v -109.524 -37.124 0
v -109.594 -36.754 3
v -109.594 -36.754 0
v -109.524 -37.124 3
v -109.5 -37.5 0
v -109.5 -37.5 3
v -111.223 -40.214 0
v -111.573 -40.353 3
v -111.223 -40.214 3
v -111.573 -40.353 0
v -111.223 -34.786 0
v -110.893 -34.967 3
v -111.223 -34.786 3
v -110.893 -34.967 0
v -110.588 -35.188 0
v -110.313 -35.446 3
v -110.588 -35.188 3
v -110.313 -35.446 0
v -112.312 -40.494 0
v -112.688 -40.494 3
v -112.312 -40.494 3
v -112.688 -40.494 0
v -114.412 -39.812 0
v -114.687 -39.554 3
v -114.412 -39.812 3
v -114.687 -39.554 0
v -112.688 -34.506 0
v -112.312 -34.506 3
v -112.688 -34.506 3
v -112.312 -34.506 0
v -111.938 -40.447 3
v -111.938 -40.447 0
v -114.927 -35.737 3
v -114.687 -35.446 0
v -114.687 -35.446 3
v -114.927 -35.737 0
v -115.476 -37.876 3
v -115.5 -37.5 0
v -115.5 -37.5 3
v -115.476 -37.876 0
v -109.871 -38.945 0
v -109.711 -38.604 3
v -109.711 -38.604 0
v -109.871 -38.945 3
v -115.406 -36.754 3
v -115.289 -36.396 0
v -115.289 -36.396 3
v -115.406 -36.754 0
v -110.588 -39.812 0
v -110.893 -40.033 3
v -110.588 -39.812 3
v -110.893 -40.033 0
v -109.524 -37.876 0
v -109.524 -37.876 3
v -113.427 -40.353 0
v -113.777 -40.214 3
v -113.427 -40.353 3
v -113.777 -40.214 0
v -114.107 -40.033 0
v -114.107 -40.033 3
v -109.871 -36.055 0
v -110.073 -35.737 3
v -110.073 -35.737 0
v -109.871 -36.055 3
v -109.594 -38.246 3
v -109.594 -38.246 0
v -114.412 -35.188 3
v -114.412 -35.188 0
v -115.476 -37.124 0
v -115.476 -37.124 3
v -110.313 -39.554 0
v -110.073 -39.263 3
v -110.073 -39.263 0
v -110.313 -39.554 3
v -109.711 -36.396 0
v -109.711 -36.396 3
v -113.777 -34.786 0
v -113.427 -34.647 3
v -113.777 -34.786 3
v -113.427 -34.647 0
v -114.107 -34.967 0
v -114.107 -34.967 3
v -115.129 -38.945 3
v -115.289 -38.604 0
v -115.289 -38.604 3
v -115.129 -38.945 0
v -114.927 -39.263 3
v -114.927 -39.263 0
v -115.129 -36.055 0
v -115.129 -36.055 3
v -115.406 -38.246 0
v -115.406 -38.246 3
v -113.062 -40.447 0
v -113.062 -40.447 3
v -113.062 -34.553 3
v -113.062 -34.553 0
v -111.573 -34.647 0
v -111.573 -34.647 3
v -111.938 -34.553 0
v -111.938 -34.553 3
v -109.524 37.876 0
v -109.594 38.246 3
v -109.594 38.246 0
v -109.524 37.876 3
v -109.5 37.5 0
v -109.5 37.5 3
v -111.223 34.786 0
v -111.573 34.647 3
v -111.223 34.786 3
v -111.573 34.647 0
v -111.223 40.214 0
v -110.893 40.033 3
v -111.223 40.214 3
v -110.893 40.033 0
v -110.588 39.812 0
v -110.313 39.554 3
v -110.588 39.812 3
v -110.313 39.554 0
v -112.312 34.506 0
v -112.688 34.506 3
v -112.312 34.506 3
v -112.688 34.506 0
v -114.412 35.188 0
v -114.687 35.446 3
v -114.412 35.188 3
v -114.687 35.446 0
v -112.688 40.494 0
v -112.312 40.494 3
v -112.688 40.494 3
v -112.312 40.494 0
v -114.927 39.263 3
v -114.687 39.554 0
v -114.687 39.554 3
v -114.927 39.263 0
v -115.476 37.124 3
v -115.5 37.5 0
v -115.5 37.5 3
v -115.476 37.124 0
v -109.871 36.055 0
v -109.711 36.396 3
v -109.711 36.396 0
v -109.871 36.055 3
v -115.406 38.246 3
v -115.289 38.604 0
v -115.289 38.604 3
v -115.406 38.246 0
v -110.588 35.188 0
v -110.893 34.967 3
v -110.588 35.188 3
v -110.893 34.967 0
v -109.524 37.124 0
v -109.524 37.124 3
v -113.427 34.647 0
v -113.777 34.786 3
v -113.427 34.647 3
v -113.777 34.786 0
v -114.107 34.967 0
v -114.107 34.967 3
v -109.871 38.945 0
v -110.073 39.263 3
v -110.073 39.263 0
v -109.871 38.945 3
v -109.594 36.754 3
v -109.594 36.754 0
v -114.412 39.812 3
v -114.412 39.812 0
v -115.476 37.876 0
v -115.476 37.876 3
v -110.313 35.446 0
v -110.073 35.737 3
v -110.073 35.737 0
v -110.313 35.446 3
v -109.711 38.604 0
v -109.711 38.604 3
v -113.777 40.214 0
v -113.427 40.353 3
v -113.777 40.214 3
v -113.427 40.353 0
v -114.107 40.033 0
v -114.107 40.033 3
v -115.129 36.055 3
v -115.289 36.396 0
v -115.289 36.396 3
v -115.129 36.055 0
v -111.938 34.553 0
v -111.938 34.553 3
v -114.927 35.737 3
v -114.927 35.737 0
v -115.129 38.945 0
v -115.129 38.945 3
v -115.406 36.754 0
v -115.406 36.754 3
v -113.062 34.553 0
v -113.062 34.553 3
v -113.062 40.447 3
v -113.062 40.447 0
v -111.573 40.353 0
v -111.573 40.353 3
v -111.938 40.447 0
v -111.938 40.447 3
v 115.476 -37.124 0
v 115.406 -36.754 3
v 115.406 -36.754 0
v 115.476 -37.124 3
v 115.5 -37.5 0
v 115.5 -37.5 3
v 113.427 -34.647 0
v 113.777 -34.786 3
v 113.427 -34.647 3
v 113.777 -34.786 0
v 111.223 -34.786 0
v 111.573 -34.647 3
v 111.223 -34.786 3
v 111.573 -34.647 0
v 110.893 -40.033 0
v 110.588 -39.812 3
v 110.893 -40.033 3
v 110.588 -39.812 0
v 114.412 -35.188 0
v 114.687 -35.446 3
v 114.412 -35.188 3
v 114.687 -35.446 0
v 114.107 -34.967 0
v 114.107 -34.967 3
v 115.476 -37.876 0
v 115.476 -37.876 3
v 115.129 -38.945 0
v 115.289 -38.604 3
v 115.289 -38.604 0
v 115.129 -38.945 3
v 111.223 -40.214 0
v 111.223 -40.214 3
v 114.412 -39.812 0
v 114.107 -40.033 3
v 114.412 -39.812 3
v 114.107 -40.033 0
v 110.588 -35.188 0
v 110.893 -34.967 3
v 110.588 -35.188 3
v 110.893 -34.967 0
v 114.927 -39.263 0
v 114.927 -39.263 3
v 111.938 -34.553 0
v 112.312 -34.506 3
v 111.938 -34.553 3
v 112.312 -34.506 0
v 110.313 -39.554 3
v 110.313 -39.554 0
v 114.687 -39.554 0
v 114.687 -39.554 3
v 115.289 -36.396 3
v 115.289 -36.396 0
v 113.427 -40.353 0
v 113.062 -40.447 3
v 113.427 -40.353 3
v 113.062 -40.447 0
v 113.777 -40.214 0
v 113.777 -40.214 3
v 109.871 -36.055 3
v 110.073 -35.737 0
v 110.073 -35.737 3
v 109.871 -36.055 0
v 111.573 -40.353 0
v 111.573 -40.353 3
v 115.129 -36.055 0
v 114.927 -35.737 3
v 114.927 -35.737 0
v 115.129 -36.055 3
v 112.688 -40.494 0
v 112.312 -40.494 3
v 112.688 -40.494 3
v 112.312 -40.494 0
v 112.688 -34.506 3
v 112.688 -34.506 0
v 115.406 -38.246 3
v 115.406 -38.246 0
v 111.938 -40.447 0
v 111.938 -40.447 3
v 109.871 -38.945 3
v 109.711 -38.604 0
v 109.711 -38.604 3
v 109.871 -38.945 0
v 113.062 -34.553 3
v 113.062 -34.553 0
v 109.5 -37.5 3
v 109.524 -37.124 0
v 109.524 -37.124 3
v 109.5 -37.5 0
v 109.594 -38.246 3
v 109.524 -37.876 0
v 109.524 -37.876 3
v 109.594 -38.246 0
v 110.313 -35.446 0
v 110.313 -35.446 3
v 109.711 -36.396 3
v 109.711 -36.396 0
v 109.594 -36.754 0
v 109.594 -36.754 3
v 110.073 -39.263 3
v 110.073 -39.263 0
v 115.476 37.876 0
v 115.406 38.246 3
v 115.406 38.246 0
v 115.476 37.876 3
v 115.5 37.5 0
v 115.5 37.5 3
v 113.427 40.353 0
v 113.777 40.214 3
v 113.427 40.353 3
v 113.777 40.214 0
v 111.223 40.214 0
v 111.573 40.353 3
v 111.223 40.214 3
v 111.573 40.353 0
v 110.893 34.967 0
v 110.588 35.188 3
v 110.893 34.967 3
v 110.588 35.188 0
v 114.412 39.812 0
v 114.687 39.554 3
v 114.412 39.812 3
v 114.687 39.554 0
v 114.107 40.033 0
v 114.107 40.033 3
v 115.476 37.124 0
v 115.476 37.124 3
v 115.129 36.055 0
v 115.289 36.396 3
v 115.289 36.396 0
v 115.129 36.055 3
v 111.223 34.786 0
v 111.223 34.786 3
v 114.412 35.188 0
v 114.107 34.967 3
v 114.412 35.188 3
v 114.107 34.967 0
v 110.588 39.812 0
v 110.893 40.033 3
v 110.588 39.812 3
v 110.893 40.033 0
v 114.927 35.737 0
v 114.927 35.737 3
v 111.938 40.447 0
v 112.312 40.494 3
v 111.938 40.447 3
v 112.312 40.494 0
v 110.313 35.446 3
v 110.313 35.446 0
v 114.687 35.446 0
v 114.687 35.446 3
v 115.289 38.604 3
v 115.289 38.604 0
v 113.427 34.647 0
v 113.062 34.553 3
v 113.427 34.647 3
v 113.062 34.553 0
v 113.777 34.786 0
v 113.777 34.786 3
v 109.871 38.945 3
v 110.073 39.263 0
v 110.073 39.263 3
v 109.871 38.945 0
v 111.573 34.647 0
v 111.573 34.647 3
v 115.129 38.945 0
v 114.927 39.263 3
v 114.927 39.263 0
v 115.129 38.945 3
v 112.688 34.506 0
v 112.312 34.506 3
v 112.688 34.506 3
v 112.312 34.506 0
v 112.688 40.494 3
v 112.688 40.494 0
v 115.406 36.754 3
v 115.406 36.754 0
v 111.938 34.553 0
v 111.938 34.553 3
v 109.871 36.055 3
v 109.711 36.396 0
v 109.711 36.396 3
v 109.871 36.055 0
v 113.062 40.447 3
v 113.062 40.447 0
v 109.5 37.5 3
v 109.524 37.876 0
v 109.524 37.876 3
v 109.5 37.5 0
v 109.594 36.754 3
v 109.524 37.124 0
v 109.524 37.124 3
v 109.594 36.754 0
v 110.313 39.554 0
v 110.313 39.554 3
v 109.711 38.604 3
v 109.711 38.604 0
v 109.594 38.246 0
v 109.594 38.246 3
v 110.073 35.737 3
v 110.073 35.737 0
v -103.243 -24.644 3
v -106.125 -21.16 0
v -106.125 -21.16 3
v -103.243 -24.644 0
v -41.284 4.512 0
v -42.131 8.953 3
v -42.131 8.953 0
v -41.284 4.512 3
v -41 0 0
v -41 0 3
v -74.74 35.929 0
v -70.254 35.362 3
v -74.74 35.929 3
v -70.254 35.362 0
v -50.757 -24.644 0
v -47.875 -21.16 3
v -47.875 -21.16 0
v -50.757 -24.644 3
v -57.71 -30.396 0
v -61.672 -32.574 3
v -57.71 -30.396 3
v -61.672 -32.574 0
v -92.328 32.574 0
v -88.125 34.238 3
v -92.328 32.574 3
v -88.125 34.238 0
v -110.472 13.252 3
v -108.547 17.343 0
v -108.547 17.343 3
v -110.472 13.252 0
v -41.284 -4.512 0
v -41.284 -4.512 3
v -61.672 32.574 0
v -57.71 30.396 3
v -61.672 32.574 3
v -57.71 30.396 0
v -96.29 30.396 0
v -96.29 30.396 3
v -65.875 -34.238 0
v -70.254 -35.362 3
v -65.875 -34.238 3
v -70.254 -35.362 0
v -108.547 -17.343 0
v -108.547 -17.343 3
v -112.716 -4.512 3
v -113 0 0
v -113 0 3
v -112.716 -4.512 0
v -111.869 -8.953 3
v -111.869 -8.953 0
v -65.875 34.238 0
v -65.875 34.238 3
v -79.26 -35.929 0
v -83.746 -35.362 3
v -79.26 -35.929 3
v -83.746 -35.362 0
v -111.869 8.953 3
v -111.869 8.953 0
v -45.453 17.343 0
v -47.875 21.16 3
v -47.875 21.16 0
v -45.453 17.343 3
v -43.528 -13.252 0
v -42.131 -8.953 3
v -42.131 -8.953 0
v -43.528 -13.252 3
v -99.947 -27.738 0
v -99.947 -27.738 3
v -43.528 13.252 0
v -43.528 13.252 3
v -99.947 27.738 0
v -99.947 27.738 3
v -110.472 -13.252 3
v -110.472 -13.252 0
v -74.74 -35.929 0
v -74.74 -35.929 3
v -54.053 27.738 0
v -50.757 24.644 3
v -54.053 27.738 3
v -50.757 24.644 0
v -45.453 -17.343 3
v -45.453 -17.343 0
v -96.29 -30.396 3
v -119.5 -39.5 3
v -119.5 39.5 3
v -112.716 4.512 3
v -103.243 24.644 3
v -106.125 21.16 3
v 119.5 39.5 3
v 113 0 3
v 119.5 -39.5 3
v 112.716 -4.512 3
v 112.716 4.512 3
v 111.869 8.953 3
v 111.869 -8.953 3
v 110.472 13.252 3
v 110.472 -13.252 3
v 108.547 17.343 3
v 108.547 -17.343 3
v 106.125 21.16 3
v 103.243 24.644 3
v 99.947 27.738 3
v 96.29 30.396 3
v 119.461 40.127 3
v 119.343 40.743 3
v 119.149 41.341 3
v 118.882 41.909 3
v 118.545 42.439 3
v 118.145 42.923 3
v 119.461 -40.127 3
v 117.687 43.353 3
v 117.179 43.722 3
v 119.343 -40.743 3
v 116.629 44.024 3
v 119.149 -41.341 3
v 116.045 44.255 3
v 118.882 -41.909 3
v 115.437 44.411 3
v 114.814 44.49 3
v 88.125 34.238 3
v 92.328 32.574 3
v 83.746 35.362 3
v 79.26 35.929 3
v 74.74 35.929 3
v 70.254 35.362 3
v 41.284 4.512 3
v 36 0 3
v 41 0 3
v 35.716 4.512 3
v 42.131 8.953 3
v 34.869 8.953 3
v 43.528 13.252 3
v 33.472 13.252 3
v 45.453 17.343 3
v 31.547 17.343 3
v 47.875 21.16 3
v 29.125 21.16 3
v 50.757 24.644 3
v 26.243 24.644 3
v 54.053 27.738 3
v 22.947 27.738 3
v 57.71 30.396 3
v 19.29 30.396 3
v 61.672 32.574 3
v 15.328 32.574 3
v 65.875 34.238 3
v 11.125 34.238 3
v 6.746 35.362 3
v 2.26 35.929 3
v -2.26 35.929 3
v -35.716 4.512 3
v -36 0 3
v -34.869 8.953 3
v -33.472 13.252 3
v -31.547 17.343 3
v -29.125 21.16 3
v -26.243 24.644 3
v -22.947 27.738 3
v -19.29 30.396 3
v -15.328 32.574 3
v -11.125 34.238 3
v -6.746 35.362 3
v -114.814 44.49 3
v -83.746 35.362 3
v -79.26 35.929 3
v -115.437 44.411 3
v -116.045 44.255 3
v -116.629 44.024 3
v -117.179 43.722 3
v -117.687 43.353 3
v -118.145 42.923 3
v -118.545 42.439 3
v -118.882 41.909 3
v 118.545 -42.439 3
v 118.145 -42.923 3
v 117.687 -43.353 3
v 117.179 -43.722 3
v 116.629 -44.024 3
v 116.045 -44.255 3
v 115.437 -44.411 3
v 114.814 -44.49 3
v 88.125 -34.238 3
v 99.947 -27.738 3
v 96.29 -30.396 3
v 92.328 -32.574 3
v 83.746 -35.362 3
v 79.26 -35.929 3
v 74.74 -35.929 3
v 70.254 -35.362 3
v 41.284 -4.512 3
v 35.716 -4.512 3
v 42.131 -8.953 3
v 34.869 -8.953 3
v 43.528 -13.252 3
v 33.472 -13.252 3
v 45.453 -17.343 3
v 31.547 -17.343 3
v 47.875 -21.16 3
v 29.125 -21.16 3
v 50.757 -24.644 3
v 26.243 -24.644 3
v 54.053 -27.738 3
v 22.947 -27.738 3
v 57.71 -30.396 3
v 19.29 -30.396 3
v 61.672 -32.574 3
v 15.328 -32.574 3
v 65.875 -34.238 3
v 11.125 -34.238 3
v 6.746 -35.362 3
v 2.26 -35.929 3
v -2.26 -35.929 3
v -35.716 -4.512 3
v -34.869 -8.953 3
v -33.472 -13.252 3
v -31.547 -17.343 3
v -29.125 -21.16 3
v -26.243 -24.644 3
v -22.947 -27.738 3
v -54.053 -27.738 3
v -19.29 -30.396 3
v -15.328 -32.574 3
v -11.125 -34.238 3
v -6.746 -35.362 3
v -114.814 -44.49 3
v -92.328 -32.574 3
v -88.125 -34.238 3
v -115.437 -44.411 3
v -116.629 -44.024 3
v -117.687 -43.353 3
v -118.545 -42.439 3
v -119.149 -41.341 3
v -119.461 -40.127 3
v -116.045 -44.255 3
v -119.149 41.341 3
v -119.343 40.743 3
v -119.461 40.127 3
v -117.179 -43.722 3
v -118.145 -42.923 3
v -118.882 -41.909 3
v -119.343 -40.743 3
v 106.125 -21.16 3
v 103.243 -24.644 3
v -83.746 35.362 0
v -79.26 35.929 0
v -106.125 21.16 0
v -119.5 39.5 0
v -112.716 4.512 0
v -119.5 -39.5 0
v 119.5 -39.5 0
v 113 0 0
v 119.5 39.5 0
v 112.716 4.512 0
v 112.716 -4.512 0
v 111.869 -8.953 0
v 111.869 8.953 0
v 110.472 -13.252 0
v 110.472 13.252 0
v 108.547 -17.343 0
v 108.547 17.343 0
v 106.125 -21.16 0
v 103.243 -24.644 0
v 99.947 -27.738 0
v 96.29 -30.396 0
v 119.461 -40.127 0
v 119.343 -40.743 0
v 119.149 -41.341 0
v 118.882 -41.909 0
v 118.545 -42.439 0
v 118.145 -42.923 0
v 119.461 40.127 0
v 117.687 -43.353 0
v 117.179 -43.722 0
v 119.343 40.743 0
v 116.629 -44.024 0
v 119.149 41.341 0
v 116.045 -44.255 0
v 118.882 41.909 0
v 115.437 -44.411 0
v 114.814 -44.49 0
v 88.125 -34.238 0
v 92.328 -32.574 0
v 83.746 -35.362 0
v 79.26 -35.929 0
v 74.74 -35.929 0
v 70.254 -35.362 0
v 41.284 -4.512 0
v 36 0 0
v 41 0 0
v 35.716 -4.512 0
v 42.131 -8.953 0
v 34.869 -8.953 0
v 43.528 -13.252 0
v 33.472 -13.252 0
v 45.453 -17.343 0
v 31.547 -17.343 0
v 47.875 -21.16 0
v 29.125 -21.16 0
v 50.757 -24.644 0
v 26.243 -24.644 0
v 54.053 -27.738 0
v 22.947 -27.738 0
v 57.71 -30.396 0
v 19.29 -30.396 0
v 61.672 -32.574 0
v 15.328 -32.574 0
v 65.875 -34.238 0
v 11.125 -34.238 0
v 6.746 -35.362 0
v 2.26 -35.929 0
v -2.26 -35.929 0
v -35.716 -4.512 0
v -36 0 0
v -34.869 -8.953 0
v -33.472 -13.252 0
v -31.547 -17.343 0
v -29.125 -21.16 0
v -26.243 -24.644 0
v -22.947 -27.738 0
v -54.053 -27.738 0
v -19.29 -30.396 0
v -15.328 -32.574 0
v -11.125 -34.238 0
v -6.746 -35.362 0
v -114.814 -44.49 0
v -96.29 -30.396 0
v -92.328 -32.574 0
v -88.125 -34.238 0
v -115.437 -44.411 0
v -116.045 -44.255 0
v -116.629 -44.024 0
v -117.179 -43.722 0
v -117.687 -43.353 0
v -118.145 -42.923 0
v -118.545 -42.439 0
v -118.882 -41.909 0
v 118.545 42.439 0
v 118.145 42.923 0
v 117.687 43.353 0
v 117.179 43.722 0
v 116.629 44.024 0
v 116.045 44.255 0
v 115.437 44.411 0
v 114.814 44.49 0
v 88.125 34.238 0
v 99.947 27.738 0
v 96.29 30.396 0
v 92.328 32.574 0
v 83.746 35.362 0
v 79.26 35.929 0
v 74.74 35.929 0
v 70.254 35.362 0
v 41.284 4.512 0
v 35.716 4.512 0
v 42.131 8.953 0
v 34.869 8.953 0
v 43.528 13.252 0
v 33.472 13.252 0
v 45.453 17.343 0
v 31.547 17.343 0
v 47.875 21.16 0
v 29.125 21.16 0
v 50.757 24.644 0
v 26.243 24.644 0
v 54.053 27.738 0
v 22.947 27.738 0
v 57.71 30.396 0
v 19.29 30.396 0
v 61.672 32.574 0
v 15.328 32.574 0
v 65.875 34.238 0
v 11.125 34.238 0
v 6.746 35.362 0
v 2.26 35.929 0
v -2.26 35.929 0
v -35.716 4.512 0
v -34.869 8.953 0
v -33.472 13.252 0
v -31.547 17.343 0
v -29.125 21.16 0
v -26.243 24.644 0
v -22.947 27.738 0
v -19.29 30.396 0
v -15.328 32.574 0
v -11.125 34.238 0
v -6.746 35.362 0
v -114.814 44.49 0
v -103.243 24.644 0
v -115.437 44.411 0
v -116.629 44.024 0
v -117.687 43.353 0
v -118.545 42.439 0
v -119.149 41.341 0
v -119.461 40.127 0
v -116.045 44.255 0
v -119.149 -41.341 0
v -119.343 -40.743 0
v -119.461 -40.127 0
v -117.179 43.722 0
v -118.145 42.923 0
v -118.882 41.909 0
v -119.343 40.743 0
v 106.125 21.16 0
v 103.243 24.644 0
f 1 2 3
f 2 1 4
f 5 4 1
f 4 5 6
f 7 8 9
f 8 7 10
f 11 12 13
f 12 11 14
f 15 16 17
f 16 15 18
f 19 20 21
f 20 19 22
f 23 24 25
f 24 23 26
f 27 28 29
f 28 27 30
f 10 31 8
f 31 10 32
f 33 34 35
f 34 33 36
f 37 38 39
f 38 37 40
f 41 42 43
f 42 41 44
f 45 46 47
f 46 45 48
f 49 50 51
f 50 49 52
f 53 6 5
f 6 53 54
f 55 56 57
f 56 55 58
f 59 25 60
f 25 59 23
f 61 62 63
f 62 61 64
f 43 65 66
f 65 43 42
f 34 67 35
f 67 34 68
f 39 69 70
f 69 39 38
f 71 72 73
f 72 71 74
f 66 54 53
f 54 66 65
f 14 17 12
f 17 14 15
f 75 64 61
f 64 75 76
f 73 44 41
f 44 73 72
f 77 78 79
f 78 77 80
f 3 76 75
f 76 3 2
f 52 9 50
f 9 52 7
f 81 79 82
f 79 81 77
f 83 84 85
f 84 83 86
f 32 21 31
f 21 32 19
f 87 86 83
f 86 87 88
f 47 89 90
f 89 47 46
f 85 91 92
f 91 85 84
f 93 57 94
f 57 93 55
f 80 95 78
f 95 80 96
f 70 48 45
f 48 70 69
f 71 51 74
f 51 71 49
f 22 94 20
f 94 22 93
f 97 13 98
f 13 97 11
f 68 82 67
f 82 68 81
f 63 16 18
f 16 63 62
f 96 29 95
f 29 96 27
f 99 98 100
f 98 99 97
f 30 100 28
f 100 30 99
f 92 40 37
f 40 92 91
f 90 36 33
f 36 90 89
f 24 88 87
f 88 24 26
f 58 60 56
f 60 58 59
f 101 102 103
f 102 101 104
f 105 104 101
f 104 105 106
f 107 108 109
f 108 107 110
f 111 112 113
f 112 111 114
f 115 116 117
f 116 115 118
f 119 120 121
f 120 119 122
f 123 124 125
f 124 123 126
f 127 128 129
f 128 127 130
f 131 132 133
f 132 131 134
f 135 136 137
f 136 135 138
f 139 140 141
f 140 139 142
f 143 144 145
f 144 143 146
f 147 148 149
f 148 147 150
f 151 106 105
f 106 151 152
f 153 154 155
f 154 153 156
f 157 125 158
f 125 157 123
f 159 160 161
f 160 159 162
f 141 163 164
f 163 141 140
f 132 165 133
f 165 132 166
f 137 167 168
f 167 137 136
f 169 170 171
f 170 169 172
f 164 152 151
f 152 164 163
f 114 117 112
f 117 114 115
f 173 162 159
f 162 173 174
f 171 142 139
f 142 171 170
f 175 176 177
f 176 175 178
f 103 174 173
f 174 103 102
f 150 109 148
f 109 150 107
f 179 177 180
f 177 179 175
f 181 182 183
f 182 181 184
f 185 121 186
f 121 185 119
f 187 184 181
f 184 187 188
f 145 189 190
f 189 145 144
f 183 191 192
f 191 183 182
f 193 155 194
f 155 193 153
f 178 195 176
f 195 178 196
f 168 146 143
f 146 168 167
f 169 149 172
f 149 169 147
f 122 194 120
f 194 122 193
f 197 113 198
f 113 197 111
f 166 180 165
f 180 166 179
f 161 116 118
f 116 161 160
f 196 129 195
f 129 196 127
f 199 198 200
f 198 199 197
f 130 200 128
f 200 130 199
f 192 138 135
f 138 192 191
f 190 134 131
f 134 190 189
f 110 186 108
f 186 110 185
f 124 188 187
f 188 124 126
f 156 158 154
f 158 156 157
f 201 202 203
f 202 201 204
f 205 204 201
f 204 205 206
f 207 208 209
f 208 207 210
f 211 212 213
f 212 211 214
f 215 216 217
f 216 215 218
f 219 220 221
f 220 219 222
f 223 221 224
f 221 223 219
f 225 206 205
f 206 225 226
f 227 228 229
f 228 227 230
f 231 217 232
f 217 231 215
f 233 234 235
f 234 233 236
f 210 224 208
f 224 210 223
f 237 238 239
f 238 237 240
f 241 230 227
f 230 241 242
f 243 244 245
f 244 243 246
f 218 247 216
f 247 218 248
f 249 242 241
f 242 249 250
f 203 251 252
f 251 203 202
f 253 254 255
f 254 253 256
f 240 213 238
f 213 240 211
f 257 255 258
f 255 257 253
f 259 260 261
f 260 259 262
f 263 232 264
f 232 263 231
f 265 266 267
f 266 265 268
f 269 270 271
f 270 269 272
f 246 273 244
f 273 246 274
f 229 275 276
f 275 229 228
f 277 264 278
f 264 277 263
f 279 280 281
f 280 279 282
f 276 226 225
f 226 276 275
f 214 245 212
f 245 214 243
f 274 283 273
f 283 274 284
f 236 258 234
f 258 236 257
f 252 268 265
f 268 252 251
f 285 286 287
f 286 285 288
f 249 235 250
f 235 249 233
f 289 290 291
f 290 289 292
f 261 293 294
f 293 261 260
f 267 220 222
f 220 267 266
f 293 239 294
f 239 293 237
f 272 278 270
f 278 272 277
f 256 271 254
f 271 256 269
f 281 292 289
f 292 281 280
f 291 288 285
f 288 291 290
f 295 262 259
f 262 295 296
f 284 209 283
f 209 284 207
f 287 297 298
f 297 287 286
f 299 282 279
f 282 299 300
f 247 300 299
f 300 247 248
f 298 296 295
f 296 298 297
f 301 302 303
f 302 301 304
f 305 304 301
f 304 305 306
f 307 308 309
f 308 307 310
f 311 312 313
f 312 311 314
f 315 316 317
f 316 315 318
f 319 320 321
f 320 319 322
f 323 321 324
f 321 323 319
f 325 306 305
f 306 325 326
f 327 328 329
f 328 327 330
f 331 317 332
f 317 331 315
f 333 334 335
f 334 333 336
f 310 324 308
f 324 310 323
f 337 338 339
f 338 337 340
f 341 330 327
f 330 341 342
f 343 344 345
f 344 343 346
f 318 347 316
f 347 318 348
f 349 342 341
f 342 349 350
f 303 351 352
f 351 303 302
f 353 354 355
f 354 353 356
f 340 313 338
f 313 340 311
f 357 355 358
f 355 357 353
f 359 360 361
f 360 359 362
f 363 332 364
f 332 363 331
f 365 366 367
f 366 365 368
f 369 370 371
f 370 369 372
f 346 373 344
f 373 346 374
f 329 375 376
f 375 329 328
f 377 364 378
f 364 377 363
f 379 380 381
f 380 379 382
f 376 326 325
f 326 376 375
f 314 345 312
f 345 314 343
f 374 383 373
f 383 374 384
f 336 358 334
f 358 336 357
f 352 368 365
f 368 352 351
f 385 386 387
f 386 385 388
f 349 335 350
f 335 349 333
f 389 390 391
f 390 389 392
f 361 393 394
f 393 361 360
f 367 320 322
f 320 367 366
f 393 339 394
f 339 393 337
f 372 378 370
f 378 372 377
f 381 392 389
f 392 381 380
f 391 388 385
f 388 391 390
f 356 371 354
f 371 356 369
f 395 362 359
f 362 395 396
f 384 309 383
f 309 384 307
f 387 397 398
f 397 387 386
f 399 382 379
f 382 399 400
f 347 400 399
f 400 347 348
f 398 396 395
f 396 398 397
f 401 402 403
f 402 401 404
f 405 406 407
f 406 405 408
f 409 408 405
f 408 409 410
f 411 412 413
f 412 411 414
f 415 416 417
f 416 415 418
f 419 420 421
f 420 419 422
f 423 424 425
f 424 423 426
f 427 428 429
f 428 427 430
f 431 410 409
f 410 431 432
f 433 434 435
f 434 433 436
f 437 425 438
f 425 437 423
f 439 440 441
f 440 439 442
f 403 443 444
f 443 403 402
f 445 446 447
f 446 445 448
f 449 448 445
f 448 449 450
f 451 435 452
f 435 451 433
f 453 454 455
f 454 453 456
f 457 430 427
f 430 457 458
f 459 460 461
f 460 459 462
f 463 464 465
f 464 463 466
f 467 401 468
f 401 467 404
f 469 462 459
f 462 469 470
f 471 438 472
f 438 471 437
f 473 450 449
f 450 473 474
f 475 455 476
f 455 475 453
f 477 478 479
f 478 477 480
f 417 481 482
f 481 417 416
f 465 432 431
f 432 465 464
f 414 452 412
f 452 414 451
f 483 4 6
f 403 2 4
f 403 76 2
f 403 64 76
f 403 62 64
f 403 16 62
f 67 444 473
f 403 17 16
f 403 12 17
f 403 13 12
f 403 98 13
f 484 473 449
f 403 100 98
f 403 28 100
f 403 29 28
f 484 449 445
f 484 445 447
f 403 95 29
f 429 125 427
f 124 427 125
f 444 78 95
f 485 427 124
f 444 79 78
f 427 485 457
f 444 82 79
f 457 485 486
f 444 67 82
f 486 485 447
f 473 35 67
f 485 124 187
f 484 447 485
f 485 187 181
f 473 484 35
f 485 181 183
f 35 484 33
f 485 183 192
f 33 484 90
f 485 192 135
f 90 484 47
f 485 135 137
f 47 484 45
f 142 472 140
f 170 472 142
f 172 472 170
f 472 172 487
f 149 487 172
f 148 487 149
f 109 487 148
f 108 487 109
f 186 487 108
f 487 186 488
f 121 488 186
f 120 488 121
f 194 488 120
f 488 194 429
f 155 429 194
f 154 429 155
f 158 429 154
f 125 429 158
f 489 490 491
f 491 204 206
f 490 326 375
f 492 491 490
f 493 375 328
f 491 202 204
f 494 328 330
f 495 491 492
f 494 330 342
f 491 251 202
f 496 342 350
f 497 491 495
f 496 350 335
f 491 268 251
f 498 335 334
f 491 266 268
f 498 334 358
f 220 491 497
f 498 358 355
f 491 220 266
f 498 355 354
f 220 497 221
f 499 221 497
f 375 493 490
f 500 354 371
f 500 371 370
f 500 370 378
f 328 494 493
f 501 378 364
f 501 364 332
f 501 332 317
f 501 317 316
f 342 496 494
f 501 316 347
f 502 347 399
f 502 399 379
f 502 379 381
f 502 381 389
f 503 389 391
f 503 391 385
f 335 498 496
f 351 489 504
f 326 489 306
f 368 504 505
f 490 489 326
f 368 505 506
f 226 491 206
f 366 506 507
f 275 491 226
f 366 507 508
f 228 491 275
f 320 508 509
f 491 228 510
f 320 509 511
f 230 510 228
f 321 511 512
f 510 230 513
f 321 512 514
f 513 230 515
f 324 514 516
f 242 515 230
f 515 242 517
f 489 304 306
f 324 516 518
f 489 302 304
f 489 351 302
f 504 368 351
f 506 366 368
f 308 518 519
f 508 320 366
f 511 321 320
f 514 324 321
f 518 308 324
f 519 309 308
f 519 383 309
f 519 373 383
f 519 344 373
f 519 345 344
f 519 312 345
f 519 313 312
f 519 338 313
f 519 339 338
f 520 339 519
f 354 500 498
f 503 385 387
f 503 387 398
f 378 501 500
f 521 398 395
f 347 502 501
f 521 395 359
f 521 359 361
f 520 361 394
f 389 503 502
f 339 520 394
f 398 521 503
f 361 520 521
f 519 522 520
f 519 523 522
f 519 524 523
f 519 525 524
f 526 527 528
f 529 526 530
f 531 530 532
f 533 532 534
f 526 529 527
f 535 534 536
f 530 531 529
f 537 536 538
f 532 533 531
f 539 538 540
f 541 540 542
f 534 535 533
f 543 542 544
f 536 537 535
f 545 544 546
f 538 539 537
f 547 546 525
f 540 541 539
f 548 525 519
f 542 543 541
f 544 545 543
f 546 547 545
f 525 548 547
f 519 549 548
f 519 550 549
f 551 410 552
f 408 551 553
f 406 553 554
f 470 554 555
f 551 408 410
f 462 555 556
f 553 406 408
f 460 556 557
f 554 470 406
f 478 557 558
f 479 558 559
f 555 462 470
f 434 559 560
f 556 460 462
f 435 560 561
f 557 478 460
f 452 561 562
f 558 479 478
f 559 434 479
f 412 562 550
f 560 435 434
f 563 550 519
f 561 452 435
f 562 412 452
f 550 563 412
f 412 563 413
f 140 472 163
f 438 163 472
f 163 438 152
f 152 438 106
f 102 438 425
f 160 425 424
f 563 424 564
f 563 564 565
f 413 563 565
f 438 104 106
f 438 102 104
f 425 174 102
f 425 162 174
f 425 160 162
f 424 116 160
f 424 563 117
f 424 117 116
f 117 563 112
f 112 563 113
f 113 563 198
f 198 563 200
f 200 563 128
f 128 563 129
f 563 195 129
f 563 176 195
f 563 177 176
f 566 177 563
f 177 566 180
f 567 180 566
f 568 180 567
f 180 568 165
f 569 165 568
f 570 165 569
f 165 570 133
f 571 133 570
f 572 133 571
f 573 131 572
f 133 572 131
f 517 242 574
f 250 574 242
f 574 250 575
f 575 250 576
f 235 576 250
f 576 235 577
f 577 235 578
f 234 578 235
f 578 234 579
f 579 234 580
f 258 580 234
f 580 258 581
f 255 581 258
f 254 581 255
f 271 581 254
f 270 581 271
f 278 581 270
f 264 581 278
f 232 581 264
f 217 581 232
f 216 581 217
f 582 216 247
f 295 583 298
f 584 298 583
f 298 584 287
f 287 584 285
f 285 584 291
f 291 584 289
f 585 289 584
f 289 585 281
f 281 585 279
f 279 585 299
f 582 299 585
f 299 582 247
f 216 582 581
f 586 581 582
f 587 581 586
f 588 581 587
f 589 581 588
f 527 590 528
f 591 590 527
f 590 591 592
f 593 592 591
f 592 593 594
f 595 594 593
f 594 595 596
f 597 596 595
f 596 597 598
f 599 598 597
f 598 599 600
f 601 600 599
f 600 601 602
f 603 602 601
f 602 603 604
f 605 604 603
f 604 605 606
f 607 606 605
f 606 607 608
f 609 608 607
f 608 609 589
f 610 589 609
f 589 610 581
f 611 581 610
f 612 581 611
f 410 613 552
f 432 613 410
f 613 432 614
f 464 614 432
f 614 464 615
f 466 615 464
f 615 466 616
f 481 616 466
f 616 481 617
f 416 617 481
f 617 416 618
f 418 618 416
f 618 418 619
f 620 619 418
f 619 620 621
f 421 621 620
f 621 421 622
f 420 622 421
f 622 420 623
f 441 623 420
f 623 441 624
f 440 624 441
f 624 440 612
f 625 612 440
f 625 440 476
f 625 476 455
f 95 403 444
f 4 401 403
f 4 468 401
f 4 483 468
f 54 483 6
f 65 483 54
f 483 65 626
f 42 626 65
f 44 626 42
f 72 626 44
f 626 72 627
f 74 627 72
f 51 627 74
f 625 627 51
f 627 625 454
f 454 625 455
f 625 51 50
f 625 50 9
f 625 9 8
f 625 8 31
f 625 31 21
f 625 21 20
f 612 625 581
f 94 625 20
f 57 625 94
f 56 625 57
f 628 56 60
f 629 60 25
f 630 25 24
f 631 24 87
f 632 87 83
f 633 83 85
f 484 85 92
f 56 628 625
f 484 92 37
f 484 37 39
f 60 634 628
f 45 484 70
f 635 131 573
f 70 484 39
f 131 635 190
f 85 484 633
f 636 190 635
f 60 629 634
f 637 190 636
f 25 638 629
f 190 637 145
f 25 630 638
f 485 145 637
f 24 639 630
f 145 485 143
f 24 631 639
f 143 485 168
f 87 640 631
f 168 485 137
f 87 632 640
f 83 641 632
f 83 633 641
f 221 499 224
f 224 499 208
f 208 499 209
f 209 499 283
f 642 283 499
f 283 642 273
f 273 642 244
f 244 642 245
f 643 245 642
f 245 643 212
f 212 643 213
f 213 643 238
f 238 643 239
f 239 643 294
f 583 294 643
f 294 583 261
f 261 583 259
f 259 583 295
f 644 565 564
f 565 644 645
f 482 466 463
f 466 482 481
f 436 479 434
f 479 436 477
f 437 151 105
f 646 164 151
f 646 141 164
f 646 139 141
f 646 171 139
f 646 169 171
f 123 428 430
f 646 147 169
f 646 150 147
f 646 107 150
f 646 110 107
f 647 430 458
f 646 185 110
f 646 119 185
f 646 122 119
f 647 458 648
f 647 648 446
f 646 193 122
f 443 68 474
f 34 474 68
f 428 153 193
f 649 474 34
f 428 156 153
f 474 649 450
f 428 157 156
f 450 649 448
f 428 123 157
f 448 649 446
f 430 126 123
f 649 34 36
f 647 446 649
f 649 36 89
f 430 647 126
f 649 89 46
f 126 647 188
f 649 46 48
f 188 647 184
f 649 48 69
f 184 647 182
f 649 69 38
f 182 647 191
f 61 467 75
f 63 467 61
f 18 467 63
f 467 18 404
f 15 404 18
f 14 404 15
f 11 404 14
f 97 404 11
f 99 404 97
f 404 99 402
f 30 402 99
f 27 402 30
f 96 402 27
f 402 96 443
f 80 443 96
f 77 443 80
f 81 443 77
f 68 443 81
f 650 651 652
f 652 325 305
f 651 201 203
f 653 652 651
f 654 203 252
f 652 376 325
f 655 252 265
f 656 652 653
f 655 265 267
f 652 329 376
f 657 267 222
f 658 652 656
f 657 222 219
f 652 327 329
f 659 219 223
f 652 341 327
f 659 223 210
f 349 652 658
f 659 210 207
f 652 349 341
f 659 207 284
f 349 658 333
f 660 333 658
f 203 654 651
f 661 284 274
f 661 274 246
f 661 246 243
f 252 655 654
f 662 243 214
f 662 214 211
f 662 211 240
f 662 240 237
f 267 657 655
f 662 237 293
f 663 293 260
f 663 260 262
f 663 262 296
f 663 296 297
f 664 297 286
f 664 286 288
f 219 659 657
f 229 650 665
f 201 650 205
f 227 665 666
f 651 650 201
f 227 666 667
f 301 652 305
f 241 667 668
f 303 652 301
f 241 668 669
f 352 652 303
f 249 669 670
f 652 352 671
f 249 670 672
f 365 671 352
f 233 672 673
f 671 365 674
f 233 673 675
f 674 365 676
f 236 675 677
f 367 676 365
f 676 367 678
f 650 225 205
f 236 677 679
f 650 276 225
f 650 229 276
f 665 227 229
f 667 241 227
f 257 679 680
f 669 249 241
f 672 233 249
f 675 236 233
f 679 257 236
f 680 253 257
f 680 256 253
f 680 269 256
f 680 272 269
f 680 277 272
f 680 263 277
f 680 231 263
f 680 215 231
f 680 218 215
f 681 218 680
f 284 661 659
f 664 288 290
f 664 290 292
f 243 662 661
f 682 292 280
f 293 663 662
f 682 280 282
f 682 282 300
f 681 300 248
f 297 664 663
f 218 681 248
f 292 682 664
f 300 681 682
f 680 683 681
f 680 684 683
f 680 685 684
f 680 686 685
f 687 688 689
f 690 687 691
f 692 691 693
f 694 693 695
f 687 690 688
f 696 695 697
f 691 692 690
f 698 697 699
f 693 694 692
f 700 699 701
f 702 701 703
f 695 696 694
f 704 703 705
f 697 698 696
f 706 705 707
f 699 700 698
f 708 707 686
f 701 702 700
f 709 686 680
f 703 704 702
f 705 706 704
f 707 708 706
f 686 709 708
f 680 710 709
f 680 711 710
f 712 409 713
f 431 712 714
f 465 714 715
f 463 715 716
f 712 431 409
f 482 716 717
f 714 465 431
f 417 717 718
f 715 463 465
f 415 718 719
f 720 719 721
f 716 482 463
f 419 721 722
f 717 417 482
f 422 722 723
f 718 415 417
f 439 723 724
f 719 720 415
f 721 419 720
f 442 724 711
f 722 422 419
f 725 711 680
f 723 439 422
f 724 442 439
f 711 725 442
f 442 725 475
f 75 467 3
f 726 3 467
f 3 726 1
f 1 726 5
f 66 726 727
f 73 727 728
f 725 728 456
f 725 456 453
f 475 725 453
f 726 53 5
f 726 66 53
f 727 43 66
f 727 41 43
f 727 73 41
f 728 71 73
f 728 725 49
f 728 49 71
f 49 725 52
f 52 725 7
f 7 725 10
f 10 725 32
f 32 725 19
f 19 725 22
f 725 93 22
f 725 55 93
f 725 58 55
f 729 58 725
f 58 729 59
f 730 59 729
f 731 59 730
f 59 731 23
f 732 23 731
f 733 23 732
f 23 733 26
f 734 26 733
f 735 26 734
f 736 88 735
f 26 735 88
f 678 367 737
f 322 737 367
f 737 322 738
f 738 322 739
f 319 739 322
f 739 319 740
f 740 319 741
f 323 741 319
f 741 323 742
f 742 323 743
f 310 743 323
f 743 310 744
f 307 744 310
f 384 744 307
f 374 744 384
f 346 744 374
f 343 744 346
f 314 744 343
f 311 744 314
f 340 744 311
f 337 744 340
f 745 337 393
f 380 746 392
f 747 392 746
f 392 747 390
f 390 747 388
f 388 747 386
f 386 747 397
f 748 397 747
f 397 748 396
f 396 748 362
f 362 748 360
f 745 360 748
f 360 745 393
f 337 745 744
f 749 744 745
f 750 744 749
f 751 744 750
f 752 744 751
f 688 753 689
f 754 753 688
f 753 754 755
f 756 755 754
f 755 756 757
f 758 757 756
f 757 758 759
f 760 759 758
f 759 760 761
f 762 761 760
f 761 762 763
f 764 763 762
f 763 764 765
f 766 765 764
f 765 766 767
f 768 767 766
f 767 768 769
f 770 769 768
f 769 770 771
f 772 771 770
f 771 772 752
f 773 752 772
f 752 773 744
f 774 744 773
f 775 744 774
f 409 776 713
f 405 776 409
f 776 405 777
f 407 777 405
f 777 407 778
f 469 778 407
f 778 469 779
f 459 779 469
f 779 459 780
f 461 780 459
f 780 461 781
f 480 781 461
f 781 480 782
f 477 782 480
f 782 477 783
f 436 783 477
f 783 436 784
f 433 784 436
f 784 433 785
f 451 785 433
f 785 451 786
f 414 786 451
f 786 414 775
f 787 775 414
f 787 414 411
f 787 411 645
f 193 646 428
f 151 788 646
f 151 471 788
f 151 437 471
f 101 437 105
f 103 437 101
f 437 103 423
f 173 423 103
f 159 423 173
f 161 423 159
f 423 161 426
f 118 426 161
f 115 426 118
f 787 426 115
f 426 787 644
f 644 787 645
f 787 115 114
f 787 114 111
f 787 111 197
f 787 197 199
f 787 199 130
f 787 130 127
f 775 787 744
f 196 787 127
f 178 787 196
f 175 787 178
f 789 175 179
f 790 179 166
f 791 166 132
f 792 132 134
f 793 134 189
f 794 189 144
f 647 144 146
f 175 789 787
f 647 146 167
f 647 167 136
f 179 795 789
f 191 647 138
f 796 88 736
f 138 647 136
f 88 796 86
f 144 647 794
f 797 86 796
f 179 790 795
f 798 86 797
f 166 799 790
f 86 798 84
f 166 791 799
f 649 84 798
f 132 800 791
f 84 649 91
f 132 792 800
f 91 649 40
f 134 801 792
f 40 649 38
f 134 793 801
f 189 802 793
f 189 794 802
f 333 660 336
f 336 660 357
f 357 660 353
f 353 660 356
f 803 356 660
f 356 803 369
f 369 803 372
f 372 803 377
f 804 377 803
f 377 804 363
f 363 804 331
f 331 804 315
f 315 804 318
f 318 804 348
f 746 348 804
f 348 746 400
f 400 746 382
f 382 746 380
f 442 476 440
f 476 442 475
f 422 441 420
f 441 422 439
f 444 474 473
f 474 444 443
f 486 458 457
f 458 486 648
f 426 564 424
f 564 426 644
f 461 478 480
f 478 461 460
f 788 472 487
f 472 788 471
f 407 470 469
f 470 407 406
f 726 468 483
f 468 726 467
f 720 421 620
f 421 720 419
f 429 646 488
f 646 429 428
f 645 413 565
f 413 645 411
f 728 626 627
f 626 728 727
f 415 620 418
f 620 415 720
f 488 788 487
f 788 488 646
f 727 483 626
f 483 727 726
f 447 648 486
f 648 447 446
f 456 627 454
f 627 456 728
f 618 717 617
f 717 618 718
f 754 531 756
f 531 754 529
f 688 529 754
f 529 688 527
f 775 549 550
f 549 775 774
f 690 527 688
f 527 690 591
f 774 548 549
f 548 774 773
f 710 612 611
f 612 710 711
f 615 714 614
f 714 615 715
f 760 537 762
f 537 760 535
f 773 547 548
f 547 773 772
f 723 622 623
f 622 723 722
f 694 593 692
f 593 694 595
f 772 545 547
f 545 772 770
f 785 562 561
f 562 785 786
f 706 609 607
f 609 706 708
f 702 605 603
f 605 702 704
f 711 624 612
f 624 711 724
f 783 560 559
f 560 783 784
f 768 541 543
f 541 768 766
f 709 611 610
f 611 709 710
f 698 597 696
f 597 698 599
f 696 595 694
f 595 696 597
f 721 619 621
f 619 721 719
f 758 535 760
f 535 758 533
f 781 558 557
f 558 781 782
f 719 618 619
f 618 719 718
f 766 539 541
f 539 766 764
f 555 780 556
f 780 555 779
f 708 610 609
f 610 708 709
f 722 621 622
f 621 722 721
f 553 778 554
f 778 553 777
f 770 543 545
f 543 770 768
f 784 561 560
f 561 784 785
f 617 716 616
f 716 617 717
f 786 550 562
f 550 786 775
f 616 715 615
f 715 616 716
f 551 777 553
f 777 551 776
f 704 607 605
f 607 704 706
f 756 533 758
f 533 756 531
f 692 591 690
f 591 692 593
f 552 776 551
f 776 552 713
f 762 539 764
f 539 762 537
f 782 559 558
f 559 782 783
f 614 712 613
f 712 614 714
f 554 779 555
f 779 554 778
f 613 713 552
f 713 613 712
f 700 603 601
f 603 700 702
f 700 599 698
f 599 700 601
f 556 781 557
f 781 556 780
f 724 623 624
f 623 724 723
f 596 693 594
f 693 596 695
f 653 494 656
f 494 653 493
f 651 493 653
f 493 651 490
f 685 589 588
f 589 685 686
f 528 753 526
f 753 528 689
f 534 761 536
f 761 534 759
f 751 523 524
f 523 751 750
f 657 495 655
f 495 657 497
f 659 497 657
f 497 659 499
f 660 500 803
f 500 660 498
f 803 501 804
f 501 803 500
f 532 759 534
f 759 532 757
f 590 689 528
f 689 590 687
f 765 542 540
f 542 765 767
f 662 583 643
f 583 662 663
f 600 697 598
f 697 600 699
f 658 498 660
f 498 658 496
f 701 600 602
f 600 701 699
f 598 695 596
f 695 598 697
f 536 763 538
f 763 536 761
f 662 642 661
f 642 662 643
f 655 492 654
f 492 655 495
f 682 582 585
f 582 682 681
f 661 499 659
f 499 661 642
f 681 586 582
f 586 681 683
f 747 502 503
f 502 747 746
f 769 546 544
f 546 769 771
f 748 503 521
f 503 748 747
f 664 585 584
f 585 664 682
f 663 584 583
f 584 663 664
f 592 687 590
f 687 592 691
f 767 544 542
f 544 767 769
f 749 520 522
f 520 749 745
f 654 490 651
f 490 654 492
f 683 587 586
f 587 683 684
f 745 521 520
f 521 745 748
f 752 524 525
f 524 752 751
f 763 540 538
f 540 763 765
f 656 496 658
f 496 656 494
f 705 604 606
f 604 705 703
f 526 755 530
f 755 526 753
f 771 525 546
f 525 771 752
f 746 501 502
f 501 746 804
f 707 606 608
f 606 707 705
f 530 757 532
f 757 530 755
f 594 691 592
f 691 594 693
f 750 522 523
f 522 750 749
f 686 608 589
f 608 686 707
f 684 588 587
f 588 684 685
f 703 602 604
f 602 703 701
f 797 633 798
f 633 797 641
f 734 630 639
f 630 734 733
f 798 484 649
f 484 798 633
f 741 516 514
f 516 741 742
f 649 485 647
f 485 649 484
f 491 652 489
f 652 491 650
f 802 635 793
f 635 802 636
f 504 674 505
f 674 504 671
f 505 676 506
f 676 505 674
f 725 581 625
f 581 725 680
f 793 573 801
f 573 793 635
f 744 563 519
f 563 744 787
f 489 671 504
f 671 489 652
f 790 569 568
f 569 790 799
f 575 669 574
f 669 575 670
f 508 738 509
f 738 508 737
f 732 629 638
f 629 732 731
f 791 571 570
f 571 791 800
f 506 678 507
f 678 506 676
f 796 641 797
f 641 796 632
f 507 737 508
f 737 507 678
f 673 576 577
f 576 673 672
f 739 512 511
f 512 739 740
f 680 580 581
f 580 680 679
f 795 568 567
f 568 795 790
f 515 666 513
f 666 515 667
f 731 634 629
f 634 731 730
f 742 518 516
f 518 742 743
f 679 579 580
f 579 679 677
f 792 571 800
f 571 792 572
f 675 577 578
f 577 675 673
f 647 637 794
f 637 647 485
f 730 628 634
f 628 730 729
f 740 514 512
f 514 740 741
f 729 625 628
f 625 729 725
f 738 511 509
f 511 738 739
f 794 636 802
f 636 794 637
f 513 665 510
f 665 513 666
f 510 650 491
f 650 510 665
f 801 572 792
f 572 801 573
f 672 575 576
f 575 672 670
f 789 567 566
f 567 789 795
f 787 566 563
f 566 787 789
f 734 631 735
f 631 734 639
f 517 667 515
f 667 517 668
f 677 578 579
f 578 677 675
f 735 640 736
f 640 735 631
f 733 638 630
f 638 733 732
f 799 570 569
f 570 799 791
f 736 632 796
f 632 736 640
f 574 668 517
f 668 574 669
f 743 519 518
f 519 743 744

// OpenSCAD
$fn = 50;


difference() {
	union() {
		hull() {
			translate(v = [-114.5000000000, 39.5000000000, 0]) {
				cylinder(h = 3, r = 5);
			}
			translate(v = [114.5000000000, 39.5000000000, 0]) {
				cylinder(h = 3, r = 5);
			}
			translate(v = [-114.5000000000, -39.5000000000, 0]) {
				cylinder(h = 3, r = 5);
			}
			translate(v = [114.5000000000, -39.5000000000, 0]) {
				cylinder(h = 3, r = 5);
			}
		}
	}
	union() {
		#translate(v = [-112.5000000000, -37.5000000000, -100.0000000000]) {
			cylinder(h = 200, r = 3.0000000000);
		}
		#translate(v = [-112.5000000000, 37.5000000000, -100.0000000000]) {
			cylinder(h = 200, r = 3.0000000000);
		}
		#translate(v = [112.5000000000, -37.5000000000, -100.0000000000]) {
			cylinder(h = 200, r = 3.0000000000);
		}
		#translate(v = [112.5000000000, 37.5000000000, -100.0000000000]) {
			cylinder(h = 200, r = 3.0000000000);
		}
		#translate(v = [-77.0000000000, 0, 0]) {
			cylinder(h = 3, r = 36.0000000000);
		}
		#cylinder(h = 3, r = 36.0000000000);
		#translate(v = [77.0000000000, 0, 0]) {
			cylinder(h = 3, r = 36.0000000000);
		}
	}
}
